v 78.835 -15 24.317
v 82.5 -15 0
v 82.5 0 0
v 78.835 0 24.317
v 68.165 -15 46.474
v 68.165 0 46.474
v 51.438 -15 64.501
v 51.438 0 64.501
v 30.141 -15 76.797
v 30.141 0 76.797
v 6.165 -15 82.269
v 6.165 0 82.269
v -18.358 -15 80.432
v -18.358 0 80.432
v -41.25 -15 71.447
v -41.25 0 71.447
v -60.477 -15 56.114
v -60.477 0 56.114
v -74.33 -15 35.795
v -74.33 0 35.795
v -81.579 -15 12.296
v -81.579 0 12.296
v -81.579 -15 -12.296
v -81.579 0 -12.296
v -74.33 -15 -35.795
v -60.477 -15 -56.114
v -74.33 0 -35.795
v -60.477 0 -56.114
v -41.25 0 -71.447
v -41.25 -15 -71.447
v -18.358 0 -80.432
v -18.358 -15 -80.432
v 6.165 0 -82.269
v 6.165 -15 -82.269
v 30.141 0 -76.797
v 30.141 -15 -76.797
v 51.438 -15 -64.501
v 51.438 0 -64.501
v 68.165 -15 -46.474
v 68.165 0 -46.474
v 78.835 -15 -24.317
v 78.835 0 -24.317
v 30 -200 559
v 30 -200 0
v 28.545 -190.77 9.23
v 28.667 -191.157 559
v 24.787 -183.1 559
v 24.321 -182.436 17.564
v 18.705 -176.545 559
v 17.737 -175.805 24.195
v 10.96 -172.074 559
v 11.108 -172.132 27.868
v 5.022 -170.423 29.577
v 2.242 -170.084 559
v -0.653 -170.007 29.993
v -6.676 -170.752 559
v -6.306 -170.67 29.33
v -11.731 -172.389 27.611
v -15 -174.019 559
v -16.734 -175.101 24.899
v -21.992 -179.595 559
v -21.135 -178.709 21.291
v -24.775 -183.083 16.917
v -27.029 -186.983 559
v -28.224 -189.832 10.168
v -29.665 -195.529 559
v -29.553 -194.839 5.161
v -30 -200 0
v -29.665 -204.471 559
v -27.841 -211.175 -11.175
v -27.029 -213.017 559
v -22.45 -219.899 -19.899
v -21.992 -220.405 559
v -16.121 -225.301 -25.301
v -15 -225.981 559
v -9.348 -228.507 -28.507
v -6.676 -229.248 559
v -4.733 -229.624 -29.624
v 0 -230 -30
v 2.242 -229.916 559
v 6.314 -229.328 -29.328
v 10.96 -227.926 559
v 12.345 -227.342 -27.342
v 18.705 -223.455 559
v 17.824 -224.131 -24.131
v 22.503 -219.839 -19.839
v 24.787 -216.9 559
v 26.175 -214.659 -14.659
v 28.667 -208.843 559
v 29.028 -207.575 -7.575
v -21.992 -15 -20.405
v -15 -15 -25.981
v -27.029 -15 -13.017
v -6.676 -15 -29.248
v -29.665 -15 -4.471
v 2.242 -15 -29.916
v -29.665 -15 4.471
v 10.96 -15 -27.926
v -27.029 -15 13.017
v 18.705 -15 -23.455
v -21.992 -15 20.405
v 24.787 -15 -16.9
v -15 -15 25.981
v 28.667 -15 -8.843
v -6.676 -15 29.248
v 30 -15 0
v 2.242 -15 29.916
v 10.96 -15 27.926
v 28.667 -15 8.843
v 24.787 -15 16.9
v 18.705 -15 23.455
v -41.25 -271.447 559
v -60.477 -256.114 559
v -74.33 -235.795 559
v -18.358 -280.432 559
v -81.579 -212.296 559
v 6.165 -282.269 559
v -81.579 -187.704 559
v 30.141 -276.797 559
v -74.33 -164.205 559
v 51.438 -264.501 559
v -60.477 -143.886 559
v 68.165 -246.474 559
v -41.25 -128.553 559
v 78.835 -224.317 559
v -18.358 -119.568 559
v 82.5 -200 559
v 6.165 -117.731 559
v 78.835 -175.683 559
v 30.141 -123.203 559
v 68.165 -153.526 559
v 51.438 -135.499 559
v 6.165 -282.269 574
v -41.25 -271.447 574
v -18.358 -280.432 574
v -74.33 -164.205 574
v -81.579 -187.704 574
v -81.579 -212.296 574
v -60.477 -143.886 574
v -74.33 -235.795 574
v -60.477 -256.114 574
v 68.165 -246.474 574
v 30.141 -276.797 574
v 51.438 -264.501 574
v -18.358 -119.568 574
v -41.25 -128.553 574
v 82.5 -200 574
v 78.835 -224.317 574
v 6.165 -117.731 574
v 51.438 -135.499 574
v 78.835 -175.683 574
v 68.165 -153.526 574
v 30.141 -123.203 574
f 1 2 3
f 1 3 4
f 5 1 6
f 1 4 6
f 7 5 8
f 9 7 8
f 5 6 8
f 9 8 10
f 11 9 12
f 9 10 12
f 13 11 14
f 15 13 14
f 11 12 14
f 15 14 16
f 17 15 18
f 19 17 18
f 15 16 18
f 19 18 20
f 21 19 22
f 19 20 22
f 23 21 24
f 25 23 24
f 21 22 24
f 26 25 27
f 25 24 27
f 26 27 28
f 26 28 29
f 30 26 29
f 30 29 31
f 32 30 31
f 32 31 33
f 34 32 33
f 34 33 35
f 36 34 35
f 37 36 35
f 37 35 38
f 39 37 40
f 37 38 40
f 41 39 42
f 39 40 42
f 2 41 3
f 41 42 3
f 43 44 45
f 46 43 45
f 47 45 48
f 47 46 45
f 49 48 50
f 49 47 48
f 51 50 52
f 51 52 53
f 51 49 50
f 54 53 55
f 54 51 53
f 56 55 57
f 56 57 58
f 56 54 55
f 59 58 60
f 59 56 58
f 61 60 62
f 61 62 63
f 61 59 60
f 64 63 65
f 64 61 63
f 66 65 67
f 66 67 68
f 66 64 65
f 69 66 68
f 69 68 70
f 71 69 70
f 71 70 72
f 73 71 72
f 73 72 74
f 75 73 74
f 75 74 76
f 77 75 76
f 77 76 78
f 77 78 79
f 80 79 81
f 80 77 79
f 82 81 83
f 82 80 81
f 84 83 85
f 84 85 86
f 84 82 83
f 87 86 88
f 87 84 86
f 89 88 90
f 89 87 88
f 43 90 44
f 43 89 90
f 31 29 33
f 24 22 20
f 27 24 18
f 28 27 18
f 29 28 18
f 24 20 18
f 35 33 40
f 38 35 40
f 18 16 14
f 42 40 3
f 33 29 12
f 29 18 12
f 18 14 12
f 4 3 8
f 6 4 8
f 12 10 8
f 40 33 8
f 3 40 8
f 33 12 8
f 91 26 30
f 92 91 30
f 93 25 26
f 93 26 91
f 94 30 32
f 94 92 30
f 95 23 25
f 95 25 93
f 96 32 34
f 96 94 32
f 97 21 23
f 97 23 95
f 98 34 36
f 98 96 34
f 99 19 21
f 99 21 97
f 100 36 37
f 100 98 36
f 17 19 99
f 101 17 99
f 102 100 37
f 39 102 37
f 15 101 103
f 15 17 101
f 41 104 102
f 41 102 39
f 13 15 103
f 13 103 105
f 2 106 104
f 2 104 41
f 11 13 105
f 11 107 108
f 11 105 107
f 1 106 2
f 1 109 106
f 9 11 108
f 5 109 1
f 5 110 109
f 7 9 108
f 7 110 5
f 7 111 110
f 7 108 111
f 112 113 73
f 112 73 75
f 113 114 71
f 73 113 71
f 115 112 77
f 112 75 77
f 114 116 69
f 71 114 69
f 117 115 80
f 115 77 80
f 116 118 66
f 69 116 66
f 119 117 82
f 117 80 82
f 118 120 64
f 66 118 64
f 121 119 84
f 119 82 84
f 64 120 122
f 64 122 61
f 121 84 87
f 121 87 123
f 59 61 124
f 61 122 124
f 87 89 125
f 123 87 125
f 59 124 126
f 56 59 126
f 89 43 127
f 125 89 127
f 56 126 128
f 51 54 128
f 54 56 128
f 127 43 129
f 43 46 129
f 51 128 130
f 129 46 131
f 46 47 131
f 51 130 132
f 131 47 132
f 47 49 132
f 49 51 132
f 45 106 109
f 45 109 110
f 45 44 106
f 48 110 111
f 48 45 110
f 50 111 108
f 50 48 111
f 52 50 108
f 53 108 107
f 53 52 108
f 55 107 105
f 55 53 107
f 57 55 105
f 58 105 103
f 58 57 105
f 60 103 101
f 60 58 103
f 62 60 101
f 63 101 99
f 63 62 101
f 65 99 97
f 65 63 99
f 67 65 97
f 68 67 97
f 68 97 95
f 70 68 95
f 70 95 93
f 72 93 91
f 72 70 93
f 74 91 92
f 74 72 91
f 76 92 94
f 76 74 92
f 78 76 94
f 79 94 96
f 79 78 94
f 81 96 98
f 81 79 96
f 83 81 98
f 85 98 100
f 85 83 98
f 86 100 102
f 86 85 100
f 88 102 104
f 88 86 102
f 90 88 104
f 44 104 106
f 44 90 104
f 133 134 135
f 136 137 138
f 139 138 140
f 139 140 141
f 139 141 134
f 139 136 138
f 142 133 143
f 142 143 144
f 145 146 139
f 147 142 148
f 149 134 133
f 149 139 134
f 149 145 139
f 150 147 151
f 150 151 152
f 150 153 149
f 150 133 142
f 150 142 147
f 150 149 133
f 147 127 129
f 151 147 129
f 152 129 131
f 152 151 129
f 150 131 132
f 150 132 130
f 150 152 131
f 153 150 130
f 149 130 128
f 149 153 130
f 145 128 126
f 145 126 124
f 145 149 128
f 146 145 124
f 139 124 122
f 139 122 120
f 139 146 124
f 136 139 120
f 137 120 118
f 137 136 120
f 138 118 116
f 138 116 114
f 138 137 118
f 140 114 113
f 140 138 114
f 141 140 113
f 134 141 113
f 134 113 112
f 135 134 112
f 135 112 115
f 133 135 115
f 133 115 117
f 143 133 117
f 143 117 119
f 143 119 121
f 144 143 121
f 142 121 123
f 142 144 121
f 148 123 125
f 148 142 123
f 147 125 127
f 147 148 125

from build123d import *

# Parameters (mm, degrees)
F0_R     = 30
F0_R_2   = 82.5
F3_DEPTH = 15
F4_R     = 82.5
F4_R_2   = 30
F5_DEPTH = 15


with BuildPart() as f2:
    # F2: sweep along a path in F1
    with BuildLine(Plane.YZ) as f2_path:
        Line((0, 0), (-200, 0))
        Line((-200, 0), (-200, 574))
    # F0 (on Front) → F2 (sweep)
    with BuildSketch(Plane.XZ):
        Circle(F0_R)
    sweep(path=f2_path.line, transition=Transition.RIGHT)

    # F0 (on Front) → F3 (join)
    with BuildSketch(Plane.XZ):
        Circle(F0_R_2)
        Circle(F0_R, mode=Mode.SUBTRACT)
    extrude(amount=F3_DEPTH)

    # F4 (on face) → F5 (join)
    with BuildSketch(Plane.XY.offset(574)):
        with Locations((0, -200)):
            Circle(F4_R)
        with Locations((0, -200)):
            Circle(F4_R_2, mode=Mode.SUBTRACT)
    extrude(amount=-F5_DEPTH)


solid = f2.part
